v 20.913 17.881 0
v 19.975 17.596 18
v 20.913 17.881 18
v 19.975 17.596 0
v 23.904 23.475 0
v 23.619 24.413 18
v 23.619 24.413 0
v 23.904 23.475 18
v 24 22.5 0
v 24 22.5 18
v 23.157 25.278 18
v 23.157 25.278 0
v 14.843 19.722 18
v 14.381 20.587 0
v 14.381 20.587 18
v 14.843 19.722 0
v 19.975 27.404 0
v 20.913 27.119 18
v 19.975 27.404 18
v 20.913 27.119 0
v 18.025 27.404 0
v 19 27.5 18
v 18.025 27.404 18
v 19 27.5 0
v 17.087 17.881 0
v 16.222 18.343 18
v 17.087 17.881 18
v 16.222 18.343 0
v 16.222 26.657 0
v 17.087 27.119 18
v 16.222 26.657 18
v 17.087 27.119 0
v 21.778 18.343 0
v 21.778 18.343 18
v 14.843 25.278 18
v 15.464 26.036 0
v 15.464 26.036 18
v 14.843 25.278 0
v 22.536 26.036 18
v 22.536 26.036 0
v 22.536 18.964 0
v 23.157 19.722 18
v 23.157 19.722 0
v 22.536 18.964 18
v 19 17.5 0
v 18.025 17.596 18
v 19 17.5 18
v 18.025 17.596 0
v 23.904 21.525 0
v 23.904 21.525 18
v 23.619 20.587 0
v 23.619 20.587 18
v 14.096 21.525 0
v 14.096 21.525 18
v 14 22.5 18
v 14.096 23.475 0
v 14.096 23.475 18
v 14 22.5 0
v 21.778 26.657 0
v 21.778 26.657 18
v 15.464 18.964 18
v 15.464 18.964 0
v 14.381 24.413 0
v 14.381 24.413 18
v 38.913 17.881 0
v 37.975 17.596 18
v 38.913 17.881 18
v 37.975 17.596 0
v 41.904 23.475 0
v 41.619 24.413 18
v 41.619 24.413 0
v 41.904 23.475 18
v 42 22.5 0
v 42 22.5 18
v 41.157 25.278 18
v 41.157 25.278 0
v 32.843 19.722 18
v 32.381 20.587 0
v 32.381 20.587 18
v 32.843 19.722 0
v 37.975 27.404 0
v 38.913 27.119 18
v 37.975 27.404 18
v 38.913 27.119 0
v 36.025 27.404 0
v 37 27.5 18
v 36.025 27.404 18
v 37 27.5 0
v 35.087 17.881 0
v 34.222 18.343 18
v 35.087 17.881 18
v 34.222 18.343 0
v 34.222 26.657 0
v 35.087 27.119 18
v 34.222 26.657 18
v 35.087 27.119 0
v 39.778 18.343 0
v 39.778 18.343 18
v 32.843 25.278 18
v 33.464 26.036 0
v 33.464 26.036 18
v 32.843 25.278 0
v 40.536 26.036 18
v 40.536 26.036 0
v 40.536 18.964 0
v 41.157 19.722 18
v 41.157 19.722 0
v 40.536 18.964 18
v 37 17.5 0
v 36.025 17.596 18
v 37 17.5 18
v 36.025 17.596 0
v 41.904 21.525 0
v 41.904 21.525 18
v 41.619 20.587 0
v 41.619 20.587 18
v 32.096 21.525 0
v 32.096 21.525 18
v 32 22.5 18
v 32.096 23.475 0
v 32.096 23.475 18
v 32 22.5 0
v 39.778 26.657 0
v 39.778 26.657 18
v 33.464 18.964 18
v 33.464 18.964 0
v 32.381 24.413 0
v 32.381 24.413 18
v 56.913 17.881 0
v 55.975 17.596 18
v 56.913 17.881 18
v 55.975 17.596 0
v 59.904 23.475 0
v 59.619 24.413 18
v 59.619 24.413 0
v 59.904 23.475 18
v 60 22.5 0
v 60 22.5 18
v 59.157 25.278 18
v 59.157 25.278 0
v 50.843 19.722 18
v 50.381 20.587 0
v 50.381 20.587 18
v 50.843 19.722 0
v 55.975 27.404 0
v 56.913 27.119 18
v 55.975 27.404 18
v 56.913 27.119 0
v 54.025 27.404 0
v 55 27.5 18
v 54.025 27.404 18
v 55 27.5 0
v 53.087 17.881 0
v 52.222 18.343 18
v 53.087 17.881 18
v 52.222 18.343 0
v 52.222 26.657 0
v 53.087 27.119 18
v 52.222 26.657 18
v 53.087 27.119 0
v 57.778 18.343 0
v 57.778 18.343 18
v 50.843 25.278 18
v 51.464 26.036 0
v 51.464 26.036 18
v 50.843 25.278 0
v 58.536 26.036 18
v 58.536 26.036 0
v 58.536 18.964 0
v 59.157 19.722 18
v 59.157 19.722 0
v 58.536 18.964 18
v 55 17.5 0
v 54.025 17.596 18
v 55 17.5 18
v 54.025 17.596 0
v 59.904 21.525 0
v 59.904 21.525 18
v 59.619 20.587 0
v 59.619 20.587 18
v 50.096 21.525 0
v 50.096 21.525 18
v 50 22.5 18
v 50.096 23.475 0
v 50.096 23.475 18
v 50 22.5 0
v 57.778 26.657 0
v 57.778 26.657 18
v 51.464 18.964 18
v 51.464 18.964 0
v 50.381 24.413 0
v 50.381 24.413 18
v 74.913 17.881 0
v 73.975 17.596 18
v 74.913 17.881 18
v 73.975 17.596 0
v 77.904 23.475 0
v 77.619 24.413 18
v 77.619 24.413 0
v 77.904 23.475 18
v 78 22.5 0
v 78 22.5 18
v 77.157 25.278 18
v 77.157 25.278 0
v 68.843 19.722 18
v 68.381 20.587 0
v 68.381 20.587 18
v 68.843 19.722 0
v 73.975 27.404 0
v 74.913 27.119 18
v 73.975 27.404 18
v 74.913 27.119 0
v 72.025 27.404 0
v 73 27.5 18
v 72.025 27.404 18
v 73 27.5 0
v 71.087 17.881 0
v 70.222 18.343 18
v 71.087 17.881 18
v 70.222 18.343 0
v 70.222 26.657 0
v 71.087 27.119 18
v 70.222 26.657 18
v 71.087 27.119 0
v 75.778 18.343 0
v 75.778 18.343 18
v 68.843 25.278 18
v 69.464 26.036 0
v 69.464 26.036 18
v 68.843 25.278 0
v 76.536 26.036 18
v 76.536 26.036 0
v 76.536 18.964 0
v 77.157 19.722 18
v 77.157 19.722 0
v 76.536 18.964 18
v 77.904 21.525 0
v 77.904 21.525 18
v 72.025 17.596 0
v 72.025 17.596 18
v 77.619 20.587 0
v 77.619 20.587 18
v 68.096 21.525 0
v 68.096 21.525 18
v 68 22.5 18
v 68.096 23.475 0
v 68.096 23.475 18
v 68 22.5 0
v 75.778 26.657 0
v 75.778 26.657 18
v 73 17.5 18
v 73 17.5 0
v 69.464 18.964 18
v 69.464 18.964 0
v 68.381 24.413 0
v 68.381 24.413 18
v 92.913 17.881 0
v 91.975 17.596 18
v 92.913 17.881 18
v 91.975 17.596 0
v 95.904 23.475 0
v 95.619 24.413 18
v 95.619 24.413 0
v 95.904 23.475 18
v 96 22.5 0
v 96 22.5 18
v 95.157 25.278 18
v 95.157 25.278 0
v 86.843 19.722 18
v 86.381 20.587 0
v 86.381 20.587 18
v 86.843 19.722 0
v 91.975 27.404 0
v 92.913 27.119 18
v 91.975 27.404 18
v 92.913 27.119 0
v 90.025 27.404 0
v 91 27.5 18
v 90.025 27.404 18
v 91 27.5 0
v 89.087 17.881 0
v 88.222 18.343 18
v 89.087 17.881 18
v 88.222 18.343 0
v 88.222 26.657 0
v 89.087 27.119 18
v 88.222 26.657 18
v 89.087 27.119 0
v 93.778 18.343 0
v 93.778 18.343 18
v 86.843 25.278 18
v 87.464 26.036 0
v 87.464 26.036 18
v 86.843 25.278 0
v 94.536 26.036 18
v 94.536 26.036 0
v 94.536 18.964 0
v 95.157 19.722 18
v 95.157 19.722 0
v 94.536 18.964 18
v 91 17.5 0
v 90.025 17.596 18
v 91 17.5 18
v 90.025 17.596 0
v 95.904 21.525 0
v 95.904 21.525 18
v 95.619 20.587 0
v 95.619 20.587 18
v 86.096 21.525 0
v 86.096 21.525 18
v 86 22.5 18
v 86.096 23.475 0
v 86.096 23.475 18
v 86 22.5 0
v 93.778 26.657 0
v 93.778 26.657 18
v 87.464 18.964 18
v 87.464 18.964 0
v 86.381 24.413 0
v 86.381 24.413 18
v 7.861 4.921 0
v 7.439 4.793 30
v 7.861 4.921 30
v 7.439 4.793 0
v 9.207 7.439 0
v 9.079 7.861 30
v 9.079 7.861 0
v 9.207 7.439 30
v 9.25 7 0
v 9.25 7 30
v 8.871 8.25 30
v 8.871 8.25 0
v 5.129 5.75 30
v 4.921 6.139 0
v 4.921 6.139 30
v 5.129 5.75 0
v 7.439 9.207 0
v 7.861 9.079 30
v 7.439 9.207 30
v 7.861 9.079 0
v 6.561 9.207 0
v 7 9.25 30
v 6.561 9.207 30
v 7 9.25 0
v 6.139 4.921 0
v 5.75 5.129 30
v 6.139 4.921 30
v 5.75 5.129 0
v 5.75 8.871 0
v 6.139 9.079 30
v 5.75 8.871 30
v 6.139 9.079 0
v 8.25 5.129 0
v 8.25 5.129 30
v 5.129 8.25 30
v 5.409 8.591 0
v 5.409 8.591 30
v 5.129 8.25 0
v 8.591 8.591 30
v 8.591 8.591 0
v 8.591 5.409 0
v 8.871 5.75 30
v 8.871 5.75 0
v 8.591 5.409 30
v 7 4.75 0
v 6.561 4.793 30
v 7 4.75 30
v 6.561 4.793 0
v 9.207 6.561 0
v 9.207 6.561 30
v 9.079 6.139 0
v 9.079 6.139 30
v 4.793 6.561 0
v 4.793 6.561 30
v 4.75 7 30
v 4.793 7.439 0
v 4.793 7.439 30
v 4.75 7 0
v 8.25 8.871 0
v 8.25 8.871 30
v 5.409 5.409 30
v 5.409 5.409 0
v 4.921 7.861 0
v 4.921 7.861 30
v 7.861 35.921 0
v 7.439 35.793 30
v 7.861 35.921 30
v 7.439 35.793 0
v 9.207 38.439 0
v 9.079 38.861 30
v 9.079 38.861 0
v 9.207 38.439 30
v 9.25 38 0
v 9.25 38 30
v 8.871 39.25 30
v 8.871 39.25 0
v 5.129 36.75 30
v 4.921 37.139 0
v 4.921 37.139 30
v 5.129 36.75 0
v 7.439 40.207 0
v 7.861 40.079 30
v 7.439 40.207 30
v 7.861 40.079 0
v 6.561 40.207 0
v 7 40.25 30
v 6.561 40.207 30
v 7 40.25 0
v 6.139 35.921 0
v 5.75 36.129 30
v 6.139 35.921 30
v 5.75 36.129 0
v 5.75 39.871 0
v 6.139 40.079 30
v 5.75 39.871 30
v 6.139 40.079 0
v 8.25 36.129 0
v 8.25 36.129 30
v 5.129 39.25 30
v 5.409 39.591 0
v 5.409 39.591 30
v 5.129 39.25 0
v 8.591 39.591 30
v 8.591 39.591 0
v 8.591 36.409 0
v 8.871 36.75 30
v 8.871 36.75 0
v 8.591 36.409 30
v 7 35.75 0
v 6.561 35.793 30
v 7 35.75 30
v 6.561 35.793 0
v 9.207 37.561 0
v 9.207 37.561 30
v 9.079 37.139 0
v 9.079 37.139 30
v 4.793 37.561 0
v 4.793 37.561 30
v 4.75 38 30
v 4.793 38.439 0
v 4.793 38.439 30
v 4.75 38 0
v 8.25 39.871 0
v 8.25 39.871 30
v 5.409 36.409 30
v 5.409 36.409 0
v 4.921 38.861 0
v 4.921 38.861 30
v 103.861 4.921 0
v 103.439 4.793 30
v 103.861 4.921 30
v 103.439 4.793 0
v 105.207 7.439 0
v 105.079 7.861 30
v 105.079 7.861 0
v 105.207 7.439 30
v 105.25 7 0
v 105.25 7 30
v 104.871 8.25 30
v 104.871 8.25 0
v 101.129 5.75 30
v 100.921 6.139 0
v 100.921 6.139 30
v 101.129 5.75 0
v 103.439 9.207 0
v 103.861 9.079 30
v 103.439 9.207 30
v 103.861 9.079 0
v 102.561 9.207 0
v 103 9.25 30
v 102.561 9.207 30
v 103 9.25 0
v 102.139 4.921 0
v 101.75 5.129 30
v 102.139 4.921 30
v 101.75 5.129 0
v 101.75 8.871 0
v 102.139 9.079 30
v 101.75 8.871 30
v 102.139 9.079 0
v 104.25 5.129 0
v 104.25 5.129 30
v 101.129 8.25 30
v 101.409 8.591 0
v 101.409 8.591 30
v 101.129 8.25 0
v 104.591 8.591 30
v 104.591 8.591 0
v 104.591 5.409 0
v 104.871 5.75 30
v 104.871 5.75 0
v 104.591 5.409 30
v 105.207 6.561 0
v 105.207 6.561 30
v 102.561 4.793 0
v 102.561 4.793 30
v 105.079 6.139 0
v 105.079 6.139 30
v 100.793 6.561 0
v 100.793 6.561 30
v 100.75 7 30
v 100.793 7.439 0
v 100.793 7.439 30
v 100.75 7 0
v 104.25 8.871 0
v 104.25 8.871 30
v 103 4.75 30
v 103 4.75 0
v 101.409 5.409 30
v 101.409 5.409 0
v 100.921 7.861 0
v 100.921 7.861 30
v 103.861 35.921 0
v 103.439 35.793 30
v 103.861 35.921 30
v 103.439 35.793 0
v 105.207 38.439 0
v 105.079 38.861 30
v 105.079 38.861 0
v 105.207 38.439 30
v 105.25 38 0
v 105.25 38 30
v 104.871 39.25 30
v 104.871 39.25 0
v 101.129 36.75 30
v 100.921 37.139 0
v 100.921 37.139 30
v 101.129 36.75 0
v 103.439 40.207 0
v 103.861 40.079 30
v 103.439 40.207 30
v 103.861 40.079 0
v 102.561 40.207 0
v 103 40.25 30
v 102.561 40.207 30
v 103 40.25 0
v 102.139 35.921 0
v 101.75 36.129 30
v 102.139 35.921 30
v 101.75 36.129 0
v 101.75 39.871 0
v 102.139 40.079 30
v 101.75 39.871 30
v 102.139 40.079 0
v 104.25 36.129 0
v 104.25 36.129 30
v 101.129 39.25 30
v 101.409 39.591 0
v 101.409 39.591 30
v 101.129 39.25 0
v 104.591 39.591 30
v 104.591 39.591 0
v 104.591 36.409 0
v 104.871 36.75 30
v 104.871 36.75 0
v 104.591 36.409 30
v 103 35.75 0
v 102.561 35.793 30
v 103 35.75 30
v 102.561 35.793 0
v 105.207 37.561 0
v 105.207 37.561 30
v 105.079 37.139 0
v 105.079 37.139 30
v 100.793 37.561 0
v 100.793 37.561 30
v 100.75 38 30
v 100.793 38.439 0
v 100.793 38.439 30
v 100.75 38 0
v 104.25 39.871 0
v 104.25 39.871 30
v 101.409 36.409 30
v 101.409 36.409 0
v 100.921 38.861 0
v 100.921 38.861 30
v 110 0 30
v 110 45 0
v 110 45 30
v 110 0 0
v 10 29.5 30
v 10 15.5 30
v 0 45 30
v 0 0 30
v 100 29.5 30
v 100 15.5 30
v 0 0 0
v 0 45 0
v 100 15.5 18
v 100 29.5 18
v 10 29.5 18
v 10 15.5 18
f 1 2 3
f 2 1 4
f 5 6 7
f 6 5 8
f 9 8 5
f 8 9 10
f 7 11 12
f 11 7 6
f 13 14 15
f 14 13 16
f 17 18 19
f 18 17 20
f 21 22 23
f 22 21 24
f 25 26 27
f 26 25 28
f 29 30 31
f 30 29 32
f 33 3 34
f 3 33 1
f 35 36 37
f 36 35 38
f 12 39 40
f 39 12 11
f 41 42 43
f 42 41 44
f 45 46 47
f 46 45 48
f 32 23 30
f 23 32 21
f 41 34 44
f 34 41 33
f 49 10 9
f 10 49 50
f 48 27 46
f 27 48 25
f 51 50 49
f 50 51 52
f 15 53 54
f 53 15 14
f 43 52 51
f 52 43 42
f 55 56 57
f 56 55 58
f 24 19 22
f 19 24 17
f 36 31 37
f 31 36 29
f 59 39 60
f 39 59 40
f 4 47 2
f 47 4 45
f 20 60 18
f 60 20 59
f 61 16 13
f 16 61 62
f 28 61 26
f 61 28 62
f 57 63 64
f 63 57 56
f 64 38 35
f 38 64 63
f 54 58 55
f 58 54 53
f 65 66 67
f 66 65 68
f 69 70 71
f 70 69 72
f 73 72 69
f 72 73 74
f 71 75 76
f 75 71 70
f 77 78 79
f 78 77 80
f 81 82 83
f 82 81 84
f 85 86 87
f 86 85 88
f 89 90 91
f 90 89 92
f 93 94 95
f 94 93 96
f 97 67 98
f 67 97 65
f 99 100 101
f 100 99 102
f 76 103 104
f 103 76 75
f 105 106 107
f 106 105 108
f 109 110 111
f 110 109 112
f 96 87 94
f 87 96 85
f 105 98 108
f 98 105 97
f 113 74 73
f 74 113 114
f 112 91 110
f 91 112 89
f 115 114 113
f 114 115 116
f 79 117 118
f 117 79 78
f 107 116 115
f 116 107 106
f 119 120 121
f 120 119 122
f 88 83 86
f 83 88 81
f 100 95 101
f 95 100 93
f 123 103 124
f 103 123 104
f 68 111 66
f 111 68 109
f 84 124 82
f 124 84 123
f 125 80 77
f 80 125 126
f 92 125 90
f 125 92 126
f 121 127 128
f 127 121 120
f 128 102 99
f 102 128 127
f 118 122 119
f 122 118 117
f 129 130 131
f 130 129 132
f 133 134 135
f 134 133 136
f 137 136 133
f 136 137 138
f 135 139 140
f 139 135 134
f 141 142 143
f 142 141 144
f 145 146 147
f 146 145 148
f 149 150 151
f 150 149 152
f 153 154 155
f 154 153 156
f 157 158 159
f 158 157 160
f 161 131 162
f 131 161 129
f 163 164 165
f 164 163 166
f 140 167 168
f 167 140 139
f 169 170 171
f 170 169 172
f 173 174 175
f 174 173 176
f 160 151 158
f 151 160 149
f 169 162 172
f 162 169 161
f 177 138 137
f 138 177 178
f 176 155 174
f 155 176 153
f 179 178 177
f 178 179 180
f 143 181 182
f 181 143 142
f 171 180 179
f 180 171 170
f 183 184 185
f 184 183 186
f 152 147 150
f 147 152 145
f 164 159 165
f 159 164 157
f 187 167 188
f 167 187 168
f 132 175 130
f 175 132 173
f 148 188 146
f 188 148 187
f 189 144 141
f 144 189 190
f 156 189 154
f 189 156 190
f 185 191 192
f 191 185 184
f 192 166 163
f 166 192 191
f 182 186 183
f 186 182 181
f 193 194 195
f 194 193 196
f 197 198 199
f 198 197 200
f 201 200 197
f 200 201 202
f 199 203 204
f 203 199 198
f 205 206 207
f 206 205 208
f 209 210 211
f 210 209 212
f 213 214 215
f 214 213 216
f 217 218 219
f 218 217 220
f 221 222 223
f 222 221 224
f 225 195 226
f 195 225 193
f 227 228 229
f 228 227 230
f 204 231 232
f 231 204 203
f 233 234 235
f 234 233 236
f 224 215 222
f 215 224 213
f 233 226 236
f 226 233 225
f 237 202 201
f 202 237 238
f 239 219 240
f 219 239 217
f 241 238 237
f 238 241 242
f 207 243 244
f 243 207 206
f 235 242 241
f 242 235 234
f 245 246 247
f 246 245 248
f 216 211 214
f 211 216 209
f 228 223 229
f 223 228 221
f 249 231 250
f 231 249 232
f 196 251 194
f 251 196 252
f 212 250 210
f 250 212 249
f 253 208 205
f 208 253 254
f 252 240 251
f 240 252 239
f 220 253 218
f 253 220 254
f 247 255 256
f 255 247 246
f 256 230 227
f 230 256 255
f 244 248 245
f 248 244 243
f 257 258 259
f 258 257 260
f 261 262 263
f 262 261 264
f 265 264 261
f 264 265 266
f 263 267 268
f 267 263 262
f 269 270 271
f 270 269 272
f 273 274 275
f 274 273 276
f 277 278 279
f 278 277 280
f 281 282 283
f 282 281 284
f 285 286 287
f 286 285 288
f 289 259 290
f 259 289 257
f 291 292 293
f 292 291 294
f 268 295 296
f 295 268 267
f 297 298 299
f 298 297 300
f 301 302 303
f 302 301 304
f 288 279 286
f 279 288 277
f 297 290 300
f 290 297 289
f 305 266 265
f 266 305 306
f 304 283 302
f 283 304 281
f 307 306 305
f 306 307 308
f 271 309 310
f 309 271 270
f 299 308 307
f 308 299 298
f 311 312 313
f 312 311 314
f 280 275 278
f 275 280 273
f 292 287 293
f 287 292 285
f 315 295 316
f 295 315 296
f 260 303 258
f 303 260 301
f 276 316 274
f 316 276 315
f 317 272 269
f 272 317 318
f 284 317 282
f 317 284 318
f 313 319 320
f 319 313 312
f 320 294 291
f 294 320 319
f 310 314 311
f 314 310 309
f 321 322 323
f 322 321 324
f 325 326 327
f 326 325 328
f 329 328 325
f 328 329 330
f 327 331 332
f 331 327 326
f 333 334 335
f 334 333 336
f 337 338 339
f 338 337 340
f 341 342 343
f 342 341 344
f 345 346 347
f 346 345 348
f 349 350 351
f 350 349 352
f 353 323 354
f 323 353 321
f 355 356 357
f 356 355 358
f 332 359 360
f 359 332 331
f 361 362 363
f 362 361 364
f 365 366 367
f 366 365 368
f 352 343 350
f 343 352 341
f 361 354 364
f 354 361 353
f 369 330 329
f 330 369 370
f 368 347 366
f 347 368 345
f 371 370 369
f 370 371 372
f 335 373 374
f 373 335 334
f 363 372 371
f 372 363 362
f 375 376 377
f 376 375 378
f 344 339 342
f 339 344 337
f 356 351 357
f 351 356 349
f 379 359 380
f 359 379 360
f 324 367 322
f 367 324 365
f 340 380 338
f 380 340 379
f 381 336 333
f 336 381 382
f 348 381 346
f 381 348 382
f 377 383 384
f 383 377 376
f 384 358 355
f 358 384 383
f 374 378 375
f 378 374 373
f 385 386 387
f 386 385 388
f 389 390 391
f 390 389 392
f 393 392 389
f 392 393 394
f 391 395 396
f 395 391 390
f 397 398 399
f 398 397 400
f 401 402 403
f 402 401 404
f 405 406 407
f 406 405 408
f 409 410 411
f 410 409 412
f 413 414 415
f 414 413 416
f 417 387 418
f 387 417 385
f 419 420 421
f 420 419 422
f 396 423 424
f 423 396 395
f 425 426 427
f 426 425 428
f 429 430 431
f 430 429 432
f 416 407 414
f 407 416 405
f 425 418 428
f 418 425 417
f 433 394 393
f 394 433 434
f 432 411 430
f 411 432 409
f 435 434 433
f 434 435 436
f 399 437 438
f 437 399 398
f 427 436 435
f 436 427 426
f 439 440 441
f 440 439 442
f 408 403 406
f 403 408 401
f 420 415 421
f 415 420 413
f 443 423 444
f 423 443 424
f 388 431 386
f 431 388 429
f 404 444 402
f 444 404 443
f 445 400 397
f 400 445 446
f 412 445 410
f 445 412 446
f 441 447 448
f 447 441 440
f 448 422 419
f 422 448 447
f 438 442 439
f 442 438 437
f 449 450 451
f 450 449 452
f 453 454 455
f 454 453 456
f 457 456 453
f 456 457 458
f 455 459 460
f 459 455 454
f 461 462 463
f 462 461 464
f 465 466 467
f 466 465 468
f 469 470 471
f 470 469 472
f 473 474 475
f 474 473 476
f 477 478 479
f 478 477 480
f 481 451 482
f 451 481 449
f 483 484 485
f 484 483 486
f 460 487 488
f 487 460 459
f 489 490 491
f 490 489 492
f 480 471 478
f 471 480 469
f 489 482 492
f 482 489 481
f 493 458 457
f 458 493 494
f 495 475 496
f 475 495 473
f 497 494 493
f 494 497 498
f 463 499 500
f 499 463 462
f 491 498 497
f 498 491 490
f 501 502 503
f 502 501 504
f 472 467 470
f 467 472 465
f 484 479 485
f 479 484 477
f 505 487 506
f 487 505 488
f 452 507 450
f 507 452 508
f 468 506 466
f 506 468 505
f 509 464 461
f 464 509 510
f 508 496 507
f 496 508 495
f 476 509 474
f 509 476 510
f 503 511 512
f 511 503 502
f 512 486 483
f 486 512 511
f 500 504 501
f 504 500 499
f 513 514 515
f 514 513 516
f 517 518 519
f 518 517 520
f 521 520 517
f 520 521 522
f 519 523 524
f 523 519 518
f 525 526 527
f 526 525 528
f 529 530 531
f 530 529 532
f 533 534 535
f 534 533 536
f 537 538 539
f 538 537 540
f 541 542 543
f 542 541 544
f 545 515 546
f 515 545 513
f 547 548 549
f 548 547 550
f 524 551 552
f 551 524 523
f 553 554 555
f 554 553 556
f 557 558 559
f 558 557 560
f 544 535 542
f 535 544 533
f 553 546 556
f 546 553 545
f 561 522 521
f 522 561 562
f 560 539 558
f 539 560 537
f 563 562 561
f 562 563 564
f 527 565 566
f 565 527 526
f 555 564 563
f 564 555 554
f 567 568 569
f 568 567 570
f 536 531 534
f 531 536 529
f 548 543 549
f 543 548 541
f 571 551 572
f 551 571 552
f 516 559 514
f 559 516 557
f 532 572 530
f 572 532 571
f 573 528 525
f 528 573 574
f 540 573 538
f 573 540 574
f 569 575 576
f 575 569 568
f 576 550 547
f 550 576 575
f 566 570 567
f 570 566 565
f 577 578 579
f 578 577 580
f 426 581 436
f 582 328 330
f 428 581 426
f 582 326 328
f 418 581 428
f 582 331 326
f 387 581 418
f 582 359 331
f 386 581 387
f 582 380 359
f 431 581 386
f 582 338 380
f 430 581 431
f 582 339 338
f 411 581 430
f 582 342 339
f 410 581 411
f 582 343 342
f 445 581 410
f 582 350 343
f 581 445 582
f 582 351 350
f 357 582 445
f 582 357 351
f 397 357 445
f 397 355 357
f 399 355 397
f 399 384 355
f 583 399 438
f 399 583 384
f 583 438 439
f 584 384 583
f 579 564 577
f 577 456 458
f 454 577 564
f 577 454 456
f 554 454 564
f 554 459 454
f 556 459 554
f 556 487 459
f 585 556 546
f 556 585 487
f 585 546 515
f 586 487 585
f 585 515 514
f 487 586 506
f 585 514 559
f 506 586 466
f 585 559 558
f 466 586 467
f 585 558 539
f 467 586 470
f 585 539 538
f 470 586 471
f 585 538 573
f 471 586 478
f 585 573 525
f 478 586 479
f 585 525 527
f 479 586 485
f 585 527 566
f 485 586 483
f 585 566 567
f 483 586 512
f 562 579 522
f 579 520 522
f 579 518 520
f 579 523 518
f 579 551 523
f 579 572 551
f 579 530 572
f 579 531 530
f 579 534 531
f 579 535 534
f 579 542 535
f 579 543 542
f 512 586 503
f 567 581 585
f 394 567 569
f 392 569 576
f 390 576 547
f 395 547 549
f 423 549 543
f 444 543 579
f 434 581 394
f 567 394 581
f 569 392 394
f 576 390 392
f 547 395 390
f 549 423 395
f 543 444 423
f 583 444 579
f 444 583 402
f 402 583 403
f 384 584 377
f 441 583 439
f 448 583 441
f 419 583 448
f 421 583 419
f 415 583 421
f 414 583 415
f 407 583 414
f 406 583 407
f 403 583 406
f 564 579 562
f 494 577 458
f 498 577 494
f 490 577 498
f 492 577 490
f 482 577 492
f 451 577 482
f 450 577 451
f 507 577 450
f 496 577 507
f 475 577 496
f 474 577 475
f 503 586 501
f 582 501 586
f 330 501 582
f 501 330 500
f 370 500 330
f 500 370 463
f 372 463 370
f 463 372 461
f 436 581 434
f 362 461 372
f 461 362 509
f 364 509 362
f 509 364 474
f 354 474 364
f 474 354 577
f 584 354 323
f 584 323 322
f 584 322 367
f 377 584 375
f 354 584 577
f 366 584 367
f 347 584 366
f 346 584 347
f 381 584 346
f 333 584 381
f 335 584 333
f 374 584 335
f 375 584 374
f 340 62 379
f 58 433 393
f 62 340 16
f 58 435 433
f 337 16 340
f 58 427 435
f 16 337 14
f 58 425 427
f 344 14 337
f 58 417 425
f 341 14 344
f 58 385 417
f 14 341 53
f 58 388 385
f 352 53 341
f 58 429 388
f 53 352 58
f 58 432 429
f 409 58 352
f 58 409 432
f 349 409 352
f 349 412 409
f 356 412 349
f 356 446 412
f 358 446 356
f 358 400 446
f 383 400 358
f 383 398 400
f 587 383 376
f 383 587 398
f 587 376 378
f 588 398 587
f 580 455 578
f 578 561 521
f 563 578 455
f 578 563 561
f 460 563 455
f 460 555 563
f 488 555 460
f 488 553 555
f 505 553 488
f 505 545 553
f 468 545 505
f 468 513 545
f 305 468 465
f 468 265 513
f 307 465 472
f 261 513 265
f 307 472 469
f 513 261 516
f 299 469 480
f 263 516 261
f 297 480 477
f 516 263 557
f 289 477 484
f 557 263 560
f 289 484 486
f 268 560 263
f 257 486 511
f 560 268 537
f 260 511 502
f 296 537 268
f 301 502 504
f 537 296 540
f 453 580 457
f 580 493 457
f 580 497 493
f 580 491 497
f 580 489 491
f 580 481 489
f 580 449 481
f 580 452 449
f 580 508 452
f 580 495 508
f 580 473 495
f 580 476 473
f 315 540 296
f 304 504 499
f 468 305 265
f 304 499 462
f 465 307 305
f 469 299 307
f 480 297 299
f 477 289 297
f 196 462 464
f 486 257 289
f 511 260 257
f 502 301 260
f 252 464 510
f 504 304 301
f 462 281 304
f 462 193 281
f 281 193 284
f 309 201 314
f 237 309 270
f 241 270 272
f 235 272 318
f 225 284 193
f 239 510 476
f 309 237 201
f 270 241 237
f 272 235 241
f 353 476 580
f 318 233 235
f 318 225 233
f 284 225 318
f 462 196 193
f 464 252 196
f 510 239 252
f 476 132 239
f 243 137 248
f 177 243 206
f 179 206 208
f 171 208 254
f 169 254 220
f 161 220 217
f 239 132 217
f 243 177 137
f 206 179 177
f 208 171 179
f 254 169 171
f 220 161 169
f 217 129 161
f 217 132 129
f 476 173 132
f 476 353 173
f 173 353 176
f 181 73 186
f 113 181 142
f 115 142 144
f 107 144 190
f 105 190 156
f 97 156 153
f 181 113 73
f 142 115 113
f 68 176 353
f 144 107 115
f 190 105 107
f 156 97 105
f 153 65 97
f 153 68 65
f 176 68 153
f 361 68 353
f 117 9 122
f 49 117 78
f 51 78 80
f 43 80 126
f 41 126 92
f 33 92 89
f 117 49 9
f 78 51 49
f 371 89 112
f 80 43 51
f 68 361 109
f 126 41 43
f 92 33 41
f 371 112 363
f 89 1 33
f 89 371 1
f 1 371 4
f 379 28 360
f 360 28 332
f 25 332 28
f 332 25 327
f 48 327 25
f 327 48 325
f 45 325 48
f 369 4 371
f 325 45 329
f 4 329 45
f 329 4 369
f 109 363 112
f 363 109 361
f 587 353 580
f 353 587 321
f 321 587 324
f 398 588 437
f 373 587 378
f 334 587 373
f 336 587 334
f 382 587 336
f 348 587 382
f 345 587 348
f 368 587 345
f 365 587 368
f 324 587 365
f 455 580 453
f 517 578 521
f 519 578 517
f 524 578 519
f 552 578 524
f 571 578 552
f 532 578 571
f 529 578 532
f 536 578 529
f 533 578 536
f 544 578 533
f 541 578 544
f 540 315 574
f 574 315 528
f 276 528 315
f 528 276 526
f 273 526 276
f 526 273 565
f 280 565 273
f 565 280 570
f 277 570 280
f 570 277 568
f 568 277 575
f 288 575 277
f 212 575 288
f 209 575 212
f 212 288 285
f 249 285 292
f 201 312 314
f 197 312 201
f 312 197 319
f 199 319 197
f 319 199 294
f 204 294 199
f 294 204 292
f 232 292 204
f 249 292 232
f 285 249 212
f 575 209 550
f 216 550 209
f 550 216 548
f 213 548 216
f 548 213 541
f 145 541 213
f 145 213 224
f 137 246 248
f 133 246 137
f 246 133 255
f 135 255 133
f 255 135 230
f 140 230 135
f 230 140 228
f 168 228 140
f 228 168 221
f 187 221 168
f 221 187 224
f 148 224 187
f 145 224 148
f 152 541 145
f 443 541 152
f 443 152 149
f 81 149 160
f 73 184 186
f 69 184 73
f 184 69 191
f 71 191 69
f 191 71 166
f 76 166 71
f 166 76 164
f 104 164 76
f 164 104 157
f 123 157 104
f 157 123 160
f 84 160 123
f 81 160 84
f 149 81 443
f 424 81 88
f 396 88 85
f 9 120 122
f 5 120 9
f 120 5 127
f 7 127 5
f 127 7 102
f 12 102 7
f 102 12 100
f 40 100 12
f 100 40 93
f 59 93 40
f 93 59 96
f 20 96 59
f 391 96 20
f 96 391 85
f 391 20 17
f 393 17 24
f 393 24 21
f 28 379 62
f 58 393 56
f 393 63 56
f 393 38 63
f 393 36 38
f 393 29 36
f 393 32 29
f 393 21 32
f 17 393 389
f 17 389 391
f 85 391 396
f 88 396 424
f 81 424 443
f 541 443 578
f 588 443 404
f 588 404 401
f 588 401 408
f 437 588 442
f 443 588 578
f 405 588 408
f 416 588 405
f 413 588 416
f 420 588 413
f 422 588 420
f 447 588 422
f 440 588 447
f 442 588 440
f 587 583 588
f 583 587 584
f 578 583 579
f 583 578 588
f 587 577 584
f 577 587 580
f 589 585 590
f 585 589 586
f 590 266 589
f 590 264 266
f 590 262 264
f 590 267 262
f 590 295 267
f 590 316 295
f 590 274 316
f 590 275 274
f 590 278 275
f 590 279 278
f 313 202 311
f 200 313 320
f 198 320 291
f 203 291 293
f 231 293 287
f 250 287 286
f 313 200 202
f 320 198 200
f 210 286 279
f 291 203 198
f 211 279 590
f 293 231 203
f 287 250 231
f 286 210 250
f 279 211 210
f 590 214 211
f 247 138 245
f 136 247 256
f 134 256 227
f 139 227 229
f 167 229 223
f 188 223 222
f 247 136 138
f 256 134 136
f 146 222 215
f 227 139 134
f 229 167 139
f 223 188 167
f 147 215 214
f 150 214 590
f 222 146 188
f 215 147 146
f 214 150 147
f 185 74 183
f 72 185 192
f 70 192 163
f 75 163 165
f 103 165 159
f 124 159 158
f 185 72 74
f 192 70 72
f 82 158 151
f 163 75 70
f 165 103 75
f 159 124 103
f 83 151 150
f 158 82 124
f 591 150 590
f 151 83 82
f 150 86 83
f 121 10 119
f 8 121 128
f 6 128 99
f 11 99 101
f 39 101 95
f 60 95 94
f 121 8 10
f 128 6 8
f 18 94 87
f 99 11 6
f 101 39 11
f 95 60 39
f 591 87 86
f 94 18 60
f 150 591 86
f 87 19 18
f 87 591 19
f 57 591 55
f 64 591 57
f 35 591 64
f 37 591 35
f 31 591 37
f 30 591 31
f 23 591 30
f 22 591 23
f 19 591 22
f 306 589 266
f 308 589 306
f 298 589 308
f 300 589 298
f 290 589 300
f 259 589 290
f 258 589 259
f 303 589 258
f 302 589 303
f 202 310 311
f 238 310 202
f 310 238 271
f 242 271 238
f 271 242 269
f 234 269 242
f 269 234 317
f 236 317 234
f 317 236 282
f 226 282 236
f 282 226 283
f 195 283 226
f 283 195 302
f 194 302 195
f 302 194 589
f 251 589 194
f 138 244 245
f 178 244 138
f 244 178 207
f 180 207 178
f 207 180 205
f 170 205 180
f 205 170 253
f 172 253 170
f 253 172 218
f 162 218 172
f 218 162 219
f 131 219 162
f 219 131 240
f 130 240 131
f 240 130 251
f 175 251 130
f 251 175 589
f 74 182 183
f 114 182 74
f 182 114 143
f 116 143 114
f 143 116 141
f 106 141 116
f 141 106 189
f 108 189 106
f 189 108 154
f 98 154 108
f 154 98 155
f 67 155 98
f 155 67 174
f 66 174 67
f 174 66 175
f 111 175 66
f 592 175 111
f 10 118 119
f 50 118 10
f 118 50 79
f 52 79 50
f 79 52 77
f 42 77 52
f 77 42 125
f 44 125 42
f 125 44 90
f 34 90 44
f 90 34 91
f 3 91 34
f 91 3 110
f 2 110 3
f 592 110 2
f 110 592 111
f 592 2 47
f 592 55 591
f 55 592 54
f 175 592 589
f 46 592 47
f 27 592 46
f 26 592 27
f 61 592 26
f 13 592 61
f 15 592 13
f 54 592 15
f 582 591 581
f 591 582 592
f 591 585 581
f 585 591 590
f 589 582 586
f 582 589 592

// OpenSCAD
$fn = 32;

// ----------------------------------------------------------------------
// Manifold block: gallery_top manifold
// ----------------------------------------------------------------------

// --- parameters (mm) ---
block_l = 110;            // block length, X
block_w = 45;             // block width, Y
block_h = 30;             // block height, Z
port_d = 10;              // port bore diameter
port_pitch = 18;          // port pitch along X
gallery_d = 14;           // top gallery width, Y
gallery_depth = 12;       // gallery pocket depth
wall_p = 10;              // gallery end wall thickness, X
mnt_d = 4.5;              // mounting hole diameter
mnt_in = 7;               // mounting hole inset from the edges

n_ports = 5;  // ports in the row
port_x0 = (block_l - (n_ports - 1) * port_pitch) / 2;  // first port X

difference() {
  cube([block_l, block_w, block_h]);
  for (i = [0 : n_ports - 1])
    translate([port_x0 + i * port_pitch, block_w / 2, -1])
      cylinder(h = block_h + 2, d = port_d);
  translate([wall_p, block_w / 2 - gallery_d / 2, block_h - gallery_depth])
    cube([block_l - 2 * wall_p, gallery_d, gallery_depth + 1]);
  for (cx = [mnt_in, block_l - mnt_in])
    for (cy = [mnt_in, block_w - mnt_in])
      translate([cx, cy, -1]) cylinder(h = block_h + 2, d = mnt_d);
}
